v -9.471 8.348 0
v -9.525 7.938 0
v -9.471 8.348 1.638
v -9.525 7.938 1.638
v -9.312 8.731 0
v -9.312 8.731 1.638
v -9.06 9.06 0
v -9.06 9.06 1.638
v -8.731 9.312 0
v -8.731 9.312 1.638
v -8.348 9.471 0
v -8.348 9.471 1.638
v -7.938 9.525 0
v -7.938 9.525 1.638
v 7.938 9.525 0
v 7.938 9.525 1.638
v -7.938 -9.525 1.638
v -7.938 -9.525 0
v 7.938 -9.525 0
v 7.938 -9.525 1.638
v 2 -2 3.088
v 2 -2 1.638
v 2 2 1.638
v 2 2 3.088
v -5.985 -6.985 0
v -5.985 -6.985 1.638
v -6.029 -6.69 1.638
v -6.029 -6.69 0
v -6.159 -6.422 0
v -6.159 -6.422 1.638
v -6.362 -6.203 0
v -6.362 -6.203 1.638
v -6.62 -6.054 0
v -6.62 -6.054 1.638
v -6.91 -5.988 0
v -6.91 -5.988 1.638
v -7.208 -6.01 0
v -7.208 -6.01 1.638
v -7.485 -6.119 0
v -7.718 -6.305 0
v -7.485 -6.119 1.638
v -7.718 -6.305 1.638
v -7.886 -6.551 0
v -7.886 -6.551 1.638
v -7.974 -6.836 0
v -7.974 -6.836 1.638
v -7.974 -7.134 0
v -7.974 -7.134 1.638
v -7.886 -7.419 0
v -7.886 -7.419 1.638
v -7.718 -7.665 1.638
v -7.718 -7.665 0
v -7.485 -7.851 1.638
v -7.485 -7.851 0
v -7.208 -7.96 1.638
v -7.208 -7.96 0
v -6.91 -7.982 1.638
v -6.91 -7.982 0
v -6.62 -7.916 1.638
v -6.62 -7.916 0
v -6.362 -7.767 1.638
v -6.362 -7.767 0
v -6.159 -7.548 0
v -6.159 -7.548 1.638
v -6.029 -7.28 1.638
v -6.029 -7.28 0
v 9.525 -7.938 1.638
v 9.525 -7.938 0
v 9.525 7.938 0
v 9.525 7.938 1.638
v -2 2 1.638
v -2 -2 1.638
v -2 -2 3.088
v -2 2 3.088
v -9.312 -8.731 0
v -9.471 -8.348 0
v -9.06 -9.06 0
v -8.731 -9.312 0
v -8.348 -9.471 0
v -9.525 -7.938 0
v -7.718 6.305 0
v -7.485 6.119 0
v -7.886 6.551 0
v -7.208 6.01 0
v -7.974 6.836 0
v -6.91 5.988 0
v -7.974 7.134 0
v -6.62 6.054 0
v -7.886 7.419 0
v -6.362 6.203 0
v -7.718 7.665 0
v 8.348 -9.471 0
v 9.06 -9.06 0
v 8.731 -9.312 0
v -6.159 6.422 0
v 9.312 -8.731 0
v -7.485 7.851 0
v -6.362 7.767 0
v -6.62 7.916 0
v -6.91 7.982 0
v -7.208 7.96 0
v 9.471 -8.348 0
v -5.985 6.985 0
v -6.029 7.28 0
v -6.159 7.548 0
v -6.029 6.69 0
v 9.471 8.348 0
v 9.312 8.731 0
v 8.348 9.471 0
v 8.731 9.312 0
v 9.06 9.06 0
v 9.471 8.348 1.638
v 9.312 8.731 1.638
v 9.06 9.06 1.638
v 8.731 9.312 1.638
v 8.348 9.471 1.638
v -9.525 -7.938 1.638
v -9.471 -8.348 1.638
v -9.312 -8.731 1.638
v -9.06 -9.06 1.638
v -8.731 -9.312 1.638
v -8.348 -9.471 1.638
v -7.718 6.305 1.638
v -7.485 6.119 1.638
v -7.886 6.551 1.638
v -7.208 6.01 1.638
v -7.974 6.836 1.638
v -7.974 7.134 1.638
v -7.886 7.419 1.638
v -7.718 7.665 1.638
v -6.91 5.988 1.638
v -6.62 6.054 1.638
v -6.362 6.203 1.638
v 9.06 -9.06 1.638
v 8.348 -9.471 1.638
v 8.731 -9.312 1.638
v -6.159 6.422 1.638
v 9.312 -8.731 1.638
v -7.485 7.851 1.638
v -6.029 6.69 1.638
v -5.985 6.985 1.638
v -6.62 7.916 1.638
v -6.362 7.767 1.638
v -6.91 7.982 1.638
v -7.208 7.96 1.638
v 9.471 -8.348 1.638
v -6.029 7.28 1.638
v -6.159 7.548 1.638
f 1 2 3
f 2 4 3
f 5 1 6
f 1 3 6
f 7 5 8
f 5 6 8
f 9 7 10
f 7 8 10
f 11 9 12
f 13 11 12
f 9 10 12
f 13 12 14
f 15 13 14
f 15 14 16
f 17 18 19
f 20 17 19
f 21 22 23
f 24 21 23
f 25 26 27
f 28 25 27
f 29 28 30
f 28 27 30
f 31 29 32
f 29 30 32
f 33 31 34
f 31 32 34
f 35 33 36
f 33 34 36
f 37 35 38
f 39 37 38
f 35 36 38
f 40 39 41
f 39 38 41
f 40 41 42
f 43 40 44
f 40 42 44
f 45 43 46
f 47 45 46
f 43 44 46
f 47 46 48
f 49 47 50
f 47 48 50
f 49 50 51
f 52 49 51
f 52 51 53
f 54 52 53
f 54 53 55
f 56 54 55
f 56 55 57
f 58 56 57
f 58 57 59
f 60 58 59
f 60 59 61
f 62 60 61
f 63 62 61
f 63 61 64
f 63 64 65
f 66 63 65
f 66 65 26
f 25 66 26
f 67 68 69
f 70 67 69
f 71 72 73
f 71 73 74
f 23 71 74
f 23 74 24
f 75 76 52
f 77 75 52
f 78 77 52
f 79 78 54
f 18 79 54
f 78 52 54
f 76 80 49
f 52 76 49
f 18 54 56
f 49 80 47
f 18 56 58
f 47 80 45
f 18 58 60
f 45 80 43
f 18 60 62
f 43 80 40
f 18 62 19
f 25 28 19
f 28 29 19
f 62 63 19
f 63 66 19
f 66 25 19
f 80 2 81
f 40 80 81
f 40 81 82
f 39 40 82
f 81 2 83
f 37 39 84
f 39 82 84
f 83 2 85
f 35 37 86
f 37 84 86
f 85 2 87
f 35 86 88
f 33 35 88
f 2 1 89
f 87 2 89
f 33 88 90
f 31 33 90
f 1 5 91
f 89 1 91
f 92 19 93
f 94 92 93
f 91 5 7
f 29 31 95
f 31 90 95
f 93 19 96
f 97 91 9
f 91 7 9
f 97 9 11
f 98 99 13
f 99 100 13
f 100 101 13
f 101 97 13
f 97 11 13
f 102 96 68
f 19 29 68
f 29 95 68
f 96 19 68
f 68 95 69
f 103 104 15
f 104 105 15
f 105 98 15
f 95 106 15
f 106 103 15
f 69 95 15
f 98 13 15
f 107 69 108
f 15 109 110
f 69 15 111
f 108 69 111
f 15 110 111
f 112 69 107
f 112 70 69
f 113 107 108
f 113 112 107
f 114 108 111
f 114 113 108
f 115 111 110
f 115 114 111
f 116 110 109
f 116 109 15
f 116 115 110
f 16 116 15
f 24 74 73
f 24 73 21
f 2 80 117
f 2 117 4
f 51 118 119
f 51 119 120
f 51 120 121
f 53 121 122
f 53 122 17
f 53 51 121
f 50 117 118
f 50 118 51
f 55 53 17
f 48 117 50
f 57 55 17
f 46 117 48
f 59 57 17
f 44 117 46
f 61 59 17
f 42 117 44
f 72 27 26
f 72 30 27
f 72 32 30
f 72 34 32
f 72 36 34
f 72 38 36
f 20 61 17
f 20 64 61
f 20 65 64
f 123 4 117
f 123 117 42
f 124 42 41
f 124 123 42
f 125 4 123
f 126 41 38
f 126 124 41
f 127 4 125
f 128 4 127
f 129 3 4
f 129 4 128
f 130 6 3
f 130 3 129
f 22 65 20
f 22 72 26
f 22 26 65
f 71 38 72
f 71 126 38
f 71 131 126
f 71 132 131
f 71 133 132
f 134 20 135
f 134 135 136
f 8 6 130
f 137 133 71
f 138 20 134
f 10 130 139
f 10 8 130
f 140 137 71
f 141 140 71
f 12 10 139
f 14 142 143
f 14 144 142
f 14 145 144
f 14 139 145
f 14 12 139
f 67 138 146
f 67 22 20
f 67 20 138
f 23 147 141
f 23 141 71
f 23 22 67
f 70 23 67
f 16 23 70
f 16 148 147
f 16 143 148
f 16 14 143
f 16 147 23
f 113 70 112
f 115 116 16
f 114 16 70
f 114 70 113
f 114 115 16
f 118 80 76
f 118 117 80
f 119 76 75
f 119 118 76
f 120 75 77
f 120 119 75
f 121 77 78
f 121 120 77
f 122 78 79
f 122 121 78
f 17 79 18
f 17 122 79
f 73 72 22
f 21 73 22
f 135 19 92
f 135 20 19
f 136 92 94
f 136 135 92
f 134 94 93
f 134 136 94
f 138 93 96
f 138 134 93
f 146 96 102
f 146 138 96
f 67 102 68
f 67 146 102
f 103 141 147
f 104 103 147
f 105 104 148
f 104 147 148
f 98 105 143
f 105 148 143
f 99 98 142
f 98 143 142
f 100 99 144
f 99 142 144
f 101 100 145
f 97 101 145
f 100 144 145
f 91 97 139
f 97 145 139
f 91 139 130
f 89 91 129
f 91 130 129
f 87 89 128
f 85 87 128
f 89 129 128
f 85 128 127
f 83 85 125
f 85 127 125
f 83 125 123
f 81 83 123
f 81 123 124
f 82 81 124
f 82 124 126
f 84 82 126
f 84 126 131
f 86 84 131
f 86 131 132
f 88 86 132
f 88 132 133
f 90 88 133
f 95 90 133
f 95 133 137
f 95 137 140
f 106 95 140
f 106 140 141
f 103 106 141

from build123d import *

# Parameters (mm, degrees)
F0_W     = 19.05
F0_H     = 19.05
F1_DEPTH = 1.6383
F2_R     = 1.5875
F3_R     = 1
F4_DEPTH = 1.6393
F5_W     = 4
F5_H     = 4
F6_DEPTH = 1.45


with BuildPart() as f1:
    # F0 (on Top) → F1 (new body)
    with BuildSketch(Plane.XY):
        Rectangle(F0_W, F0_H)
    extrude(amount=F1_DEPTH)

    # F2
    f2_edges = [f1.edges().sort_by_distance(p)[0] for p in [
        (-9.525, 9.525, 0.81915),
        (9.525, 9.525, 0.81915),
        (9.525, -9.525, 0.81915),
        (-9.525, -9.525, 0.81915),
    ]]
    fillet(f2_edges, radius=F2_R)

    # F3 (on face) → F4 (cut, through all)
    with BuildSketch(Plane.XY.offset(1.6383)):
        with Locations((-6.985, 6.985)):
            Circle(F3_R)
        with Locations((-6.985, -6.985)):
            Circle(F3_R)
    extrude(amount=-F4_DEPTH, mode=Mode.SUBTRACT)

    # F5 (on face) → F6 (join)
    with BuildSketch(Plane.XY.offset(1.6383)):
        Rectangle(F5_W, F5_H)
    extrude(amount=F6_DEPTH)


solid = f1.part
